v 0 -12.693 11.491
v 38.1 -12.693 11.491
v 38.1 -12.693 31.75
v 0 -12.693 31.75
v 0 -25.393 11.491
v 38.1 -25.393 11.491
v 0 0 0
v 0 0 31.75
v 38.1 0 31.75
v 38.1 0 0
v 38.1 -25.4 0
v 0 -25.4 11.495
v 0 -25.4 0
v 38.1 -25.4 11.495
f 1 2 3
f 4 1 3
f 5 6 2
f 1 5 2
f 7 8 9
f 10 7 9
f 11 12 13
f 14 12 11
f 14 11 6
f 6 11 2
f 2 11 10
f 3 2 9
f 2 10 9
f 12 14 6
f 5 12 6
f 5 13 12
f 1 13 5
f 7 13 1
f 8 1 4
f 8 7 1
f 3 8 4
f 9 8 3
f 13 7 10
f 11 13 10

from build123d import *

# Parameters (mm, degrees)
F0_W     = 38.1
F0_H     = 38.1
F1_DEPTH = 25.4
F3_DEPTH = 50.8
F4_DEPTH = 6.35


with BuildPart() as f1:
    # F0 (on Front) → F1 (new body)
    with BuildSketch(Plane.XZ):
        with Locations((19.05, 19.05)):
            Rectangle(F0_W, F0_H)
    extrude(amount=F1_DEPTH)

    # F2 (on face) → F3 (cut)
    with BuildSketch(Plane.YZ.offset(38.1)):
        Polygon((-12.6932453566, 11.4907970736), (-12.6932453566, 38.1), (-25.4, 38.1), (-25.4, 11.4952089814), (-25.3932453566, 11.4907970736), align=None)
    extrude(amount=-F3_DEPTH, mode=Mode.SUBTRACT)

    # F4 (cut): a face of the model
    f4_faces = [f1.faces().sort_by_distance(p)[0] for p in [
        (19.05, -6.3466226783, 38.1),
    ]]
    extrude(f4_faces, amount=-F4_DEPTH, mode=Mode.SUBTRACT)


solid = f1.part
